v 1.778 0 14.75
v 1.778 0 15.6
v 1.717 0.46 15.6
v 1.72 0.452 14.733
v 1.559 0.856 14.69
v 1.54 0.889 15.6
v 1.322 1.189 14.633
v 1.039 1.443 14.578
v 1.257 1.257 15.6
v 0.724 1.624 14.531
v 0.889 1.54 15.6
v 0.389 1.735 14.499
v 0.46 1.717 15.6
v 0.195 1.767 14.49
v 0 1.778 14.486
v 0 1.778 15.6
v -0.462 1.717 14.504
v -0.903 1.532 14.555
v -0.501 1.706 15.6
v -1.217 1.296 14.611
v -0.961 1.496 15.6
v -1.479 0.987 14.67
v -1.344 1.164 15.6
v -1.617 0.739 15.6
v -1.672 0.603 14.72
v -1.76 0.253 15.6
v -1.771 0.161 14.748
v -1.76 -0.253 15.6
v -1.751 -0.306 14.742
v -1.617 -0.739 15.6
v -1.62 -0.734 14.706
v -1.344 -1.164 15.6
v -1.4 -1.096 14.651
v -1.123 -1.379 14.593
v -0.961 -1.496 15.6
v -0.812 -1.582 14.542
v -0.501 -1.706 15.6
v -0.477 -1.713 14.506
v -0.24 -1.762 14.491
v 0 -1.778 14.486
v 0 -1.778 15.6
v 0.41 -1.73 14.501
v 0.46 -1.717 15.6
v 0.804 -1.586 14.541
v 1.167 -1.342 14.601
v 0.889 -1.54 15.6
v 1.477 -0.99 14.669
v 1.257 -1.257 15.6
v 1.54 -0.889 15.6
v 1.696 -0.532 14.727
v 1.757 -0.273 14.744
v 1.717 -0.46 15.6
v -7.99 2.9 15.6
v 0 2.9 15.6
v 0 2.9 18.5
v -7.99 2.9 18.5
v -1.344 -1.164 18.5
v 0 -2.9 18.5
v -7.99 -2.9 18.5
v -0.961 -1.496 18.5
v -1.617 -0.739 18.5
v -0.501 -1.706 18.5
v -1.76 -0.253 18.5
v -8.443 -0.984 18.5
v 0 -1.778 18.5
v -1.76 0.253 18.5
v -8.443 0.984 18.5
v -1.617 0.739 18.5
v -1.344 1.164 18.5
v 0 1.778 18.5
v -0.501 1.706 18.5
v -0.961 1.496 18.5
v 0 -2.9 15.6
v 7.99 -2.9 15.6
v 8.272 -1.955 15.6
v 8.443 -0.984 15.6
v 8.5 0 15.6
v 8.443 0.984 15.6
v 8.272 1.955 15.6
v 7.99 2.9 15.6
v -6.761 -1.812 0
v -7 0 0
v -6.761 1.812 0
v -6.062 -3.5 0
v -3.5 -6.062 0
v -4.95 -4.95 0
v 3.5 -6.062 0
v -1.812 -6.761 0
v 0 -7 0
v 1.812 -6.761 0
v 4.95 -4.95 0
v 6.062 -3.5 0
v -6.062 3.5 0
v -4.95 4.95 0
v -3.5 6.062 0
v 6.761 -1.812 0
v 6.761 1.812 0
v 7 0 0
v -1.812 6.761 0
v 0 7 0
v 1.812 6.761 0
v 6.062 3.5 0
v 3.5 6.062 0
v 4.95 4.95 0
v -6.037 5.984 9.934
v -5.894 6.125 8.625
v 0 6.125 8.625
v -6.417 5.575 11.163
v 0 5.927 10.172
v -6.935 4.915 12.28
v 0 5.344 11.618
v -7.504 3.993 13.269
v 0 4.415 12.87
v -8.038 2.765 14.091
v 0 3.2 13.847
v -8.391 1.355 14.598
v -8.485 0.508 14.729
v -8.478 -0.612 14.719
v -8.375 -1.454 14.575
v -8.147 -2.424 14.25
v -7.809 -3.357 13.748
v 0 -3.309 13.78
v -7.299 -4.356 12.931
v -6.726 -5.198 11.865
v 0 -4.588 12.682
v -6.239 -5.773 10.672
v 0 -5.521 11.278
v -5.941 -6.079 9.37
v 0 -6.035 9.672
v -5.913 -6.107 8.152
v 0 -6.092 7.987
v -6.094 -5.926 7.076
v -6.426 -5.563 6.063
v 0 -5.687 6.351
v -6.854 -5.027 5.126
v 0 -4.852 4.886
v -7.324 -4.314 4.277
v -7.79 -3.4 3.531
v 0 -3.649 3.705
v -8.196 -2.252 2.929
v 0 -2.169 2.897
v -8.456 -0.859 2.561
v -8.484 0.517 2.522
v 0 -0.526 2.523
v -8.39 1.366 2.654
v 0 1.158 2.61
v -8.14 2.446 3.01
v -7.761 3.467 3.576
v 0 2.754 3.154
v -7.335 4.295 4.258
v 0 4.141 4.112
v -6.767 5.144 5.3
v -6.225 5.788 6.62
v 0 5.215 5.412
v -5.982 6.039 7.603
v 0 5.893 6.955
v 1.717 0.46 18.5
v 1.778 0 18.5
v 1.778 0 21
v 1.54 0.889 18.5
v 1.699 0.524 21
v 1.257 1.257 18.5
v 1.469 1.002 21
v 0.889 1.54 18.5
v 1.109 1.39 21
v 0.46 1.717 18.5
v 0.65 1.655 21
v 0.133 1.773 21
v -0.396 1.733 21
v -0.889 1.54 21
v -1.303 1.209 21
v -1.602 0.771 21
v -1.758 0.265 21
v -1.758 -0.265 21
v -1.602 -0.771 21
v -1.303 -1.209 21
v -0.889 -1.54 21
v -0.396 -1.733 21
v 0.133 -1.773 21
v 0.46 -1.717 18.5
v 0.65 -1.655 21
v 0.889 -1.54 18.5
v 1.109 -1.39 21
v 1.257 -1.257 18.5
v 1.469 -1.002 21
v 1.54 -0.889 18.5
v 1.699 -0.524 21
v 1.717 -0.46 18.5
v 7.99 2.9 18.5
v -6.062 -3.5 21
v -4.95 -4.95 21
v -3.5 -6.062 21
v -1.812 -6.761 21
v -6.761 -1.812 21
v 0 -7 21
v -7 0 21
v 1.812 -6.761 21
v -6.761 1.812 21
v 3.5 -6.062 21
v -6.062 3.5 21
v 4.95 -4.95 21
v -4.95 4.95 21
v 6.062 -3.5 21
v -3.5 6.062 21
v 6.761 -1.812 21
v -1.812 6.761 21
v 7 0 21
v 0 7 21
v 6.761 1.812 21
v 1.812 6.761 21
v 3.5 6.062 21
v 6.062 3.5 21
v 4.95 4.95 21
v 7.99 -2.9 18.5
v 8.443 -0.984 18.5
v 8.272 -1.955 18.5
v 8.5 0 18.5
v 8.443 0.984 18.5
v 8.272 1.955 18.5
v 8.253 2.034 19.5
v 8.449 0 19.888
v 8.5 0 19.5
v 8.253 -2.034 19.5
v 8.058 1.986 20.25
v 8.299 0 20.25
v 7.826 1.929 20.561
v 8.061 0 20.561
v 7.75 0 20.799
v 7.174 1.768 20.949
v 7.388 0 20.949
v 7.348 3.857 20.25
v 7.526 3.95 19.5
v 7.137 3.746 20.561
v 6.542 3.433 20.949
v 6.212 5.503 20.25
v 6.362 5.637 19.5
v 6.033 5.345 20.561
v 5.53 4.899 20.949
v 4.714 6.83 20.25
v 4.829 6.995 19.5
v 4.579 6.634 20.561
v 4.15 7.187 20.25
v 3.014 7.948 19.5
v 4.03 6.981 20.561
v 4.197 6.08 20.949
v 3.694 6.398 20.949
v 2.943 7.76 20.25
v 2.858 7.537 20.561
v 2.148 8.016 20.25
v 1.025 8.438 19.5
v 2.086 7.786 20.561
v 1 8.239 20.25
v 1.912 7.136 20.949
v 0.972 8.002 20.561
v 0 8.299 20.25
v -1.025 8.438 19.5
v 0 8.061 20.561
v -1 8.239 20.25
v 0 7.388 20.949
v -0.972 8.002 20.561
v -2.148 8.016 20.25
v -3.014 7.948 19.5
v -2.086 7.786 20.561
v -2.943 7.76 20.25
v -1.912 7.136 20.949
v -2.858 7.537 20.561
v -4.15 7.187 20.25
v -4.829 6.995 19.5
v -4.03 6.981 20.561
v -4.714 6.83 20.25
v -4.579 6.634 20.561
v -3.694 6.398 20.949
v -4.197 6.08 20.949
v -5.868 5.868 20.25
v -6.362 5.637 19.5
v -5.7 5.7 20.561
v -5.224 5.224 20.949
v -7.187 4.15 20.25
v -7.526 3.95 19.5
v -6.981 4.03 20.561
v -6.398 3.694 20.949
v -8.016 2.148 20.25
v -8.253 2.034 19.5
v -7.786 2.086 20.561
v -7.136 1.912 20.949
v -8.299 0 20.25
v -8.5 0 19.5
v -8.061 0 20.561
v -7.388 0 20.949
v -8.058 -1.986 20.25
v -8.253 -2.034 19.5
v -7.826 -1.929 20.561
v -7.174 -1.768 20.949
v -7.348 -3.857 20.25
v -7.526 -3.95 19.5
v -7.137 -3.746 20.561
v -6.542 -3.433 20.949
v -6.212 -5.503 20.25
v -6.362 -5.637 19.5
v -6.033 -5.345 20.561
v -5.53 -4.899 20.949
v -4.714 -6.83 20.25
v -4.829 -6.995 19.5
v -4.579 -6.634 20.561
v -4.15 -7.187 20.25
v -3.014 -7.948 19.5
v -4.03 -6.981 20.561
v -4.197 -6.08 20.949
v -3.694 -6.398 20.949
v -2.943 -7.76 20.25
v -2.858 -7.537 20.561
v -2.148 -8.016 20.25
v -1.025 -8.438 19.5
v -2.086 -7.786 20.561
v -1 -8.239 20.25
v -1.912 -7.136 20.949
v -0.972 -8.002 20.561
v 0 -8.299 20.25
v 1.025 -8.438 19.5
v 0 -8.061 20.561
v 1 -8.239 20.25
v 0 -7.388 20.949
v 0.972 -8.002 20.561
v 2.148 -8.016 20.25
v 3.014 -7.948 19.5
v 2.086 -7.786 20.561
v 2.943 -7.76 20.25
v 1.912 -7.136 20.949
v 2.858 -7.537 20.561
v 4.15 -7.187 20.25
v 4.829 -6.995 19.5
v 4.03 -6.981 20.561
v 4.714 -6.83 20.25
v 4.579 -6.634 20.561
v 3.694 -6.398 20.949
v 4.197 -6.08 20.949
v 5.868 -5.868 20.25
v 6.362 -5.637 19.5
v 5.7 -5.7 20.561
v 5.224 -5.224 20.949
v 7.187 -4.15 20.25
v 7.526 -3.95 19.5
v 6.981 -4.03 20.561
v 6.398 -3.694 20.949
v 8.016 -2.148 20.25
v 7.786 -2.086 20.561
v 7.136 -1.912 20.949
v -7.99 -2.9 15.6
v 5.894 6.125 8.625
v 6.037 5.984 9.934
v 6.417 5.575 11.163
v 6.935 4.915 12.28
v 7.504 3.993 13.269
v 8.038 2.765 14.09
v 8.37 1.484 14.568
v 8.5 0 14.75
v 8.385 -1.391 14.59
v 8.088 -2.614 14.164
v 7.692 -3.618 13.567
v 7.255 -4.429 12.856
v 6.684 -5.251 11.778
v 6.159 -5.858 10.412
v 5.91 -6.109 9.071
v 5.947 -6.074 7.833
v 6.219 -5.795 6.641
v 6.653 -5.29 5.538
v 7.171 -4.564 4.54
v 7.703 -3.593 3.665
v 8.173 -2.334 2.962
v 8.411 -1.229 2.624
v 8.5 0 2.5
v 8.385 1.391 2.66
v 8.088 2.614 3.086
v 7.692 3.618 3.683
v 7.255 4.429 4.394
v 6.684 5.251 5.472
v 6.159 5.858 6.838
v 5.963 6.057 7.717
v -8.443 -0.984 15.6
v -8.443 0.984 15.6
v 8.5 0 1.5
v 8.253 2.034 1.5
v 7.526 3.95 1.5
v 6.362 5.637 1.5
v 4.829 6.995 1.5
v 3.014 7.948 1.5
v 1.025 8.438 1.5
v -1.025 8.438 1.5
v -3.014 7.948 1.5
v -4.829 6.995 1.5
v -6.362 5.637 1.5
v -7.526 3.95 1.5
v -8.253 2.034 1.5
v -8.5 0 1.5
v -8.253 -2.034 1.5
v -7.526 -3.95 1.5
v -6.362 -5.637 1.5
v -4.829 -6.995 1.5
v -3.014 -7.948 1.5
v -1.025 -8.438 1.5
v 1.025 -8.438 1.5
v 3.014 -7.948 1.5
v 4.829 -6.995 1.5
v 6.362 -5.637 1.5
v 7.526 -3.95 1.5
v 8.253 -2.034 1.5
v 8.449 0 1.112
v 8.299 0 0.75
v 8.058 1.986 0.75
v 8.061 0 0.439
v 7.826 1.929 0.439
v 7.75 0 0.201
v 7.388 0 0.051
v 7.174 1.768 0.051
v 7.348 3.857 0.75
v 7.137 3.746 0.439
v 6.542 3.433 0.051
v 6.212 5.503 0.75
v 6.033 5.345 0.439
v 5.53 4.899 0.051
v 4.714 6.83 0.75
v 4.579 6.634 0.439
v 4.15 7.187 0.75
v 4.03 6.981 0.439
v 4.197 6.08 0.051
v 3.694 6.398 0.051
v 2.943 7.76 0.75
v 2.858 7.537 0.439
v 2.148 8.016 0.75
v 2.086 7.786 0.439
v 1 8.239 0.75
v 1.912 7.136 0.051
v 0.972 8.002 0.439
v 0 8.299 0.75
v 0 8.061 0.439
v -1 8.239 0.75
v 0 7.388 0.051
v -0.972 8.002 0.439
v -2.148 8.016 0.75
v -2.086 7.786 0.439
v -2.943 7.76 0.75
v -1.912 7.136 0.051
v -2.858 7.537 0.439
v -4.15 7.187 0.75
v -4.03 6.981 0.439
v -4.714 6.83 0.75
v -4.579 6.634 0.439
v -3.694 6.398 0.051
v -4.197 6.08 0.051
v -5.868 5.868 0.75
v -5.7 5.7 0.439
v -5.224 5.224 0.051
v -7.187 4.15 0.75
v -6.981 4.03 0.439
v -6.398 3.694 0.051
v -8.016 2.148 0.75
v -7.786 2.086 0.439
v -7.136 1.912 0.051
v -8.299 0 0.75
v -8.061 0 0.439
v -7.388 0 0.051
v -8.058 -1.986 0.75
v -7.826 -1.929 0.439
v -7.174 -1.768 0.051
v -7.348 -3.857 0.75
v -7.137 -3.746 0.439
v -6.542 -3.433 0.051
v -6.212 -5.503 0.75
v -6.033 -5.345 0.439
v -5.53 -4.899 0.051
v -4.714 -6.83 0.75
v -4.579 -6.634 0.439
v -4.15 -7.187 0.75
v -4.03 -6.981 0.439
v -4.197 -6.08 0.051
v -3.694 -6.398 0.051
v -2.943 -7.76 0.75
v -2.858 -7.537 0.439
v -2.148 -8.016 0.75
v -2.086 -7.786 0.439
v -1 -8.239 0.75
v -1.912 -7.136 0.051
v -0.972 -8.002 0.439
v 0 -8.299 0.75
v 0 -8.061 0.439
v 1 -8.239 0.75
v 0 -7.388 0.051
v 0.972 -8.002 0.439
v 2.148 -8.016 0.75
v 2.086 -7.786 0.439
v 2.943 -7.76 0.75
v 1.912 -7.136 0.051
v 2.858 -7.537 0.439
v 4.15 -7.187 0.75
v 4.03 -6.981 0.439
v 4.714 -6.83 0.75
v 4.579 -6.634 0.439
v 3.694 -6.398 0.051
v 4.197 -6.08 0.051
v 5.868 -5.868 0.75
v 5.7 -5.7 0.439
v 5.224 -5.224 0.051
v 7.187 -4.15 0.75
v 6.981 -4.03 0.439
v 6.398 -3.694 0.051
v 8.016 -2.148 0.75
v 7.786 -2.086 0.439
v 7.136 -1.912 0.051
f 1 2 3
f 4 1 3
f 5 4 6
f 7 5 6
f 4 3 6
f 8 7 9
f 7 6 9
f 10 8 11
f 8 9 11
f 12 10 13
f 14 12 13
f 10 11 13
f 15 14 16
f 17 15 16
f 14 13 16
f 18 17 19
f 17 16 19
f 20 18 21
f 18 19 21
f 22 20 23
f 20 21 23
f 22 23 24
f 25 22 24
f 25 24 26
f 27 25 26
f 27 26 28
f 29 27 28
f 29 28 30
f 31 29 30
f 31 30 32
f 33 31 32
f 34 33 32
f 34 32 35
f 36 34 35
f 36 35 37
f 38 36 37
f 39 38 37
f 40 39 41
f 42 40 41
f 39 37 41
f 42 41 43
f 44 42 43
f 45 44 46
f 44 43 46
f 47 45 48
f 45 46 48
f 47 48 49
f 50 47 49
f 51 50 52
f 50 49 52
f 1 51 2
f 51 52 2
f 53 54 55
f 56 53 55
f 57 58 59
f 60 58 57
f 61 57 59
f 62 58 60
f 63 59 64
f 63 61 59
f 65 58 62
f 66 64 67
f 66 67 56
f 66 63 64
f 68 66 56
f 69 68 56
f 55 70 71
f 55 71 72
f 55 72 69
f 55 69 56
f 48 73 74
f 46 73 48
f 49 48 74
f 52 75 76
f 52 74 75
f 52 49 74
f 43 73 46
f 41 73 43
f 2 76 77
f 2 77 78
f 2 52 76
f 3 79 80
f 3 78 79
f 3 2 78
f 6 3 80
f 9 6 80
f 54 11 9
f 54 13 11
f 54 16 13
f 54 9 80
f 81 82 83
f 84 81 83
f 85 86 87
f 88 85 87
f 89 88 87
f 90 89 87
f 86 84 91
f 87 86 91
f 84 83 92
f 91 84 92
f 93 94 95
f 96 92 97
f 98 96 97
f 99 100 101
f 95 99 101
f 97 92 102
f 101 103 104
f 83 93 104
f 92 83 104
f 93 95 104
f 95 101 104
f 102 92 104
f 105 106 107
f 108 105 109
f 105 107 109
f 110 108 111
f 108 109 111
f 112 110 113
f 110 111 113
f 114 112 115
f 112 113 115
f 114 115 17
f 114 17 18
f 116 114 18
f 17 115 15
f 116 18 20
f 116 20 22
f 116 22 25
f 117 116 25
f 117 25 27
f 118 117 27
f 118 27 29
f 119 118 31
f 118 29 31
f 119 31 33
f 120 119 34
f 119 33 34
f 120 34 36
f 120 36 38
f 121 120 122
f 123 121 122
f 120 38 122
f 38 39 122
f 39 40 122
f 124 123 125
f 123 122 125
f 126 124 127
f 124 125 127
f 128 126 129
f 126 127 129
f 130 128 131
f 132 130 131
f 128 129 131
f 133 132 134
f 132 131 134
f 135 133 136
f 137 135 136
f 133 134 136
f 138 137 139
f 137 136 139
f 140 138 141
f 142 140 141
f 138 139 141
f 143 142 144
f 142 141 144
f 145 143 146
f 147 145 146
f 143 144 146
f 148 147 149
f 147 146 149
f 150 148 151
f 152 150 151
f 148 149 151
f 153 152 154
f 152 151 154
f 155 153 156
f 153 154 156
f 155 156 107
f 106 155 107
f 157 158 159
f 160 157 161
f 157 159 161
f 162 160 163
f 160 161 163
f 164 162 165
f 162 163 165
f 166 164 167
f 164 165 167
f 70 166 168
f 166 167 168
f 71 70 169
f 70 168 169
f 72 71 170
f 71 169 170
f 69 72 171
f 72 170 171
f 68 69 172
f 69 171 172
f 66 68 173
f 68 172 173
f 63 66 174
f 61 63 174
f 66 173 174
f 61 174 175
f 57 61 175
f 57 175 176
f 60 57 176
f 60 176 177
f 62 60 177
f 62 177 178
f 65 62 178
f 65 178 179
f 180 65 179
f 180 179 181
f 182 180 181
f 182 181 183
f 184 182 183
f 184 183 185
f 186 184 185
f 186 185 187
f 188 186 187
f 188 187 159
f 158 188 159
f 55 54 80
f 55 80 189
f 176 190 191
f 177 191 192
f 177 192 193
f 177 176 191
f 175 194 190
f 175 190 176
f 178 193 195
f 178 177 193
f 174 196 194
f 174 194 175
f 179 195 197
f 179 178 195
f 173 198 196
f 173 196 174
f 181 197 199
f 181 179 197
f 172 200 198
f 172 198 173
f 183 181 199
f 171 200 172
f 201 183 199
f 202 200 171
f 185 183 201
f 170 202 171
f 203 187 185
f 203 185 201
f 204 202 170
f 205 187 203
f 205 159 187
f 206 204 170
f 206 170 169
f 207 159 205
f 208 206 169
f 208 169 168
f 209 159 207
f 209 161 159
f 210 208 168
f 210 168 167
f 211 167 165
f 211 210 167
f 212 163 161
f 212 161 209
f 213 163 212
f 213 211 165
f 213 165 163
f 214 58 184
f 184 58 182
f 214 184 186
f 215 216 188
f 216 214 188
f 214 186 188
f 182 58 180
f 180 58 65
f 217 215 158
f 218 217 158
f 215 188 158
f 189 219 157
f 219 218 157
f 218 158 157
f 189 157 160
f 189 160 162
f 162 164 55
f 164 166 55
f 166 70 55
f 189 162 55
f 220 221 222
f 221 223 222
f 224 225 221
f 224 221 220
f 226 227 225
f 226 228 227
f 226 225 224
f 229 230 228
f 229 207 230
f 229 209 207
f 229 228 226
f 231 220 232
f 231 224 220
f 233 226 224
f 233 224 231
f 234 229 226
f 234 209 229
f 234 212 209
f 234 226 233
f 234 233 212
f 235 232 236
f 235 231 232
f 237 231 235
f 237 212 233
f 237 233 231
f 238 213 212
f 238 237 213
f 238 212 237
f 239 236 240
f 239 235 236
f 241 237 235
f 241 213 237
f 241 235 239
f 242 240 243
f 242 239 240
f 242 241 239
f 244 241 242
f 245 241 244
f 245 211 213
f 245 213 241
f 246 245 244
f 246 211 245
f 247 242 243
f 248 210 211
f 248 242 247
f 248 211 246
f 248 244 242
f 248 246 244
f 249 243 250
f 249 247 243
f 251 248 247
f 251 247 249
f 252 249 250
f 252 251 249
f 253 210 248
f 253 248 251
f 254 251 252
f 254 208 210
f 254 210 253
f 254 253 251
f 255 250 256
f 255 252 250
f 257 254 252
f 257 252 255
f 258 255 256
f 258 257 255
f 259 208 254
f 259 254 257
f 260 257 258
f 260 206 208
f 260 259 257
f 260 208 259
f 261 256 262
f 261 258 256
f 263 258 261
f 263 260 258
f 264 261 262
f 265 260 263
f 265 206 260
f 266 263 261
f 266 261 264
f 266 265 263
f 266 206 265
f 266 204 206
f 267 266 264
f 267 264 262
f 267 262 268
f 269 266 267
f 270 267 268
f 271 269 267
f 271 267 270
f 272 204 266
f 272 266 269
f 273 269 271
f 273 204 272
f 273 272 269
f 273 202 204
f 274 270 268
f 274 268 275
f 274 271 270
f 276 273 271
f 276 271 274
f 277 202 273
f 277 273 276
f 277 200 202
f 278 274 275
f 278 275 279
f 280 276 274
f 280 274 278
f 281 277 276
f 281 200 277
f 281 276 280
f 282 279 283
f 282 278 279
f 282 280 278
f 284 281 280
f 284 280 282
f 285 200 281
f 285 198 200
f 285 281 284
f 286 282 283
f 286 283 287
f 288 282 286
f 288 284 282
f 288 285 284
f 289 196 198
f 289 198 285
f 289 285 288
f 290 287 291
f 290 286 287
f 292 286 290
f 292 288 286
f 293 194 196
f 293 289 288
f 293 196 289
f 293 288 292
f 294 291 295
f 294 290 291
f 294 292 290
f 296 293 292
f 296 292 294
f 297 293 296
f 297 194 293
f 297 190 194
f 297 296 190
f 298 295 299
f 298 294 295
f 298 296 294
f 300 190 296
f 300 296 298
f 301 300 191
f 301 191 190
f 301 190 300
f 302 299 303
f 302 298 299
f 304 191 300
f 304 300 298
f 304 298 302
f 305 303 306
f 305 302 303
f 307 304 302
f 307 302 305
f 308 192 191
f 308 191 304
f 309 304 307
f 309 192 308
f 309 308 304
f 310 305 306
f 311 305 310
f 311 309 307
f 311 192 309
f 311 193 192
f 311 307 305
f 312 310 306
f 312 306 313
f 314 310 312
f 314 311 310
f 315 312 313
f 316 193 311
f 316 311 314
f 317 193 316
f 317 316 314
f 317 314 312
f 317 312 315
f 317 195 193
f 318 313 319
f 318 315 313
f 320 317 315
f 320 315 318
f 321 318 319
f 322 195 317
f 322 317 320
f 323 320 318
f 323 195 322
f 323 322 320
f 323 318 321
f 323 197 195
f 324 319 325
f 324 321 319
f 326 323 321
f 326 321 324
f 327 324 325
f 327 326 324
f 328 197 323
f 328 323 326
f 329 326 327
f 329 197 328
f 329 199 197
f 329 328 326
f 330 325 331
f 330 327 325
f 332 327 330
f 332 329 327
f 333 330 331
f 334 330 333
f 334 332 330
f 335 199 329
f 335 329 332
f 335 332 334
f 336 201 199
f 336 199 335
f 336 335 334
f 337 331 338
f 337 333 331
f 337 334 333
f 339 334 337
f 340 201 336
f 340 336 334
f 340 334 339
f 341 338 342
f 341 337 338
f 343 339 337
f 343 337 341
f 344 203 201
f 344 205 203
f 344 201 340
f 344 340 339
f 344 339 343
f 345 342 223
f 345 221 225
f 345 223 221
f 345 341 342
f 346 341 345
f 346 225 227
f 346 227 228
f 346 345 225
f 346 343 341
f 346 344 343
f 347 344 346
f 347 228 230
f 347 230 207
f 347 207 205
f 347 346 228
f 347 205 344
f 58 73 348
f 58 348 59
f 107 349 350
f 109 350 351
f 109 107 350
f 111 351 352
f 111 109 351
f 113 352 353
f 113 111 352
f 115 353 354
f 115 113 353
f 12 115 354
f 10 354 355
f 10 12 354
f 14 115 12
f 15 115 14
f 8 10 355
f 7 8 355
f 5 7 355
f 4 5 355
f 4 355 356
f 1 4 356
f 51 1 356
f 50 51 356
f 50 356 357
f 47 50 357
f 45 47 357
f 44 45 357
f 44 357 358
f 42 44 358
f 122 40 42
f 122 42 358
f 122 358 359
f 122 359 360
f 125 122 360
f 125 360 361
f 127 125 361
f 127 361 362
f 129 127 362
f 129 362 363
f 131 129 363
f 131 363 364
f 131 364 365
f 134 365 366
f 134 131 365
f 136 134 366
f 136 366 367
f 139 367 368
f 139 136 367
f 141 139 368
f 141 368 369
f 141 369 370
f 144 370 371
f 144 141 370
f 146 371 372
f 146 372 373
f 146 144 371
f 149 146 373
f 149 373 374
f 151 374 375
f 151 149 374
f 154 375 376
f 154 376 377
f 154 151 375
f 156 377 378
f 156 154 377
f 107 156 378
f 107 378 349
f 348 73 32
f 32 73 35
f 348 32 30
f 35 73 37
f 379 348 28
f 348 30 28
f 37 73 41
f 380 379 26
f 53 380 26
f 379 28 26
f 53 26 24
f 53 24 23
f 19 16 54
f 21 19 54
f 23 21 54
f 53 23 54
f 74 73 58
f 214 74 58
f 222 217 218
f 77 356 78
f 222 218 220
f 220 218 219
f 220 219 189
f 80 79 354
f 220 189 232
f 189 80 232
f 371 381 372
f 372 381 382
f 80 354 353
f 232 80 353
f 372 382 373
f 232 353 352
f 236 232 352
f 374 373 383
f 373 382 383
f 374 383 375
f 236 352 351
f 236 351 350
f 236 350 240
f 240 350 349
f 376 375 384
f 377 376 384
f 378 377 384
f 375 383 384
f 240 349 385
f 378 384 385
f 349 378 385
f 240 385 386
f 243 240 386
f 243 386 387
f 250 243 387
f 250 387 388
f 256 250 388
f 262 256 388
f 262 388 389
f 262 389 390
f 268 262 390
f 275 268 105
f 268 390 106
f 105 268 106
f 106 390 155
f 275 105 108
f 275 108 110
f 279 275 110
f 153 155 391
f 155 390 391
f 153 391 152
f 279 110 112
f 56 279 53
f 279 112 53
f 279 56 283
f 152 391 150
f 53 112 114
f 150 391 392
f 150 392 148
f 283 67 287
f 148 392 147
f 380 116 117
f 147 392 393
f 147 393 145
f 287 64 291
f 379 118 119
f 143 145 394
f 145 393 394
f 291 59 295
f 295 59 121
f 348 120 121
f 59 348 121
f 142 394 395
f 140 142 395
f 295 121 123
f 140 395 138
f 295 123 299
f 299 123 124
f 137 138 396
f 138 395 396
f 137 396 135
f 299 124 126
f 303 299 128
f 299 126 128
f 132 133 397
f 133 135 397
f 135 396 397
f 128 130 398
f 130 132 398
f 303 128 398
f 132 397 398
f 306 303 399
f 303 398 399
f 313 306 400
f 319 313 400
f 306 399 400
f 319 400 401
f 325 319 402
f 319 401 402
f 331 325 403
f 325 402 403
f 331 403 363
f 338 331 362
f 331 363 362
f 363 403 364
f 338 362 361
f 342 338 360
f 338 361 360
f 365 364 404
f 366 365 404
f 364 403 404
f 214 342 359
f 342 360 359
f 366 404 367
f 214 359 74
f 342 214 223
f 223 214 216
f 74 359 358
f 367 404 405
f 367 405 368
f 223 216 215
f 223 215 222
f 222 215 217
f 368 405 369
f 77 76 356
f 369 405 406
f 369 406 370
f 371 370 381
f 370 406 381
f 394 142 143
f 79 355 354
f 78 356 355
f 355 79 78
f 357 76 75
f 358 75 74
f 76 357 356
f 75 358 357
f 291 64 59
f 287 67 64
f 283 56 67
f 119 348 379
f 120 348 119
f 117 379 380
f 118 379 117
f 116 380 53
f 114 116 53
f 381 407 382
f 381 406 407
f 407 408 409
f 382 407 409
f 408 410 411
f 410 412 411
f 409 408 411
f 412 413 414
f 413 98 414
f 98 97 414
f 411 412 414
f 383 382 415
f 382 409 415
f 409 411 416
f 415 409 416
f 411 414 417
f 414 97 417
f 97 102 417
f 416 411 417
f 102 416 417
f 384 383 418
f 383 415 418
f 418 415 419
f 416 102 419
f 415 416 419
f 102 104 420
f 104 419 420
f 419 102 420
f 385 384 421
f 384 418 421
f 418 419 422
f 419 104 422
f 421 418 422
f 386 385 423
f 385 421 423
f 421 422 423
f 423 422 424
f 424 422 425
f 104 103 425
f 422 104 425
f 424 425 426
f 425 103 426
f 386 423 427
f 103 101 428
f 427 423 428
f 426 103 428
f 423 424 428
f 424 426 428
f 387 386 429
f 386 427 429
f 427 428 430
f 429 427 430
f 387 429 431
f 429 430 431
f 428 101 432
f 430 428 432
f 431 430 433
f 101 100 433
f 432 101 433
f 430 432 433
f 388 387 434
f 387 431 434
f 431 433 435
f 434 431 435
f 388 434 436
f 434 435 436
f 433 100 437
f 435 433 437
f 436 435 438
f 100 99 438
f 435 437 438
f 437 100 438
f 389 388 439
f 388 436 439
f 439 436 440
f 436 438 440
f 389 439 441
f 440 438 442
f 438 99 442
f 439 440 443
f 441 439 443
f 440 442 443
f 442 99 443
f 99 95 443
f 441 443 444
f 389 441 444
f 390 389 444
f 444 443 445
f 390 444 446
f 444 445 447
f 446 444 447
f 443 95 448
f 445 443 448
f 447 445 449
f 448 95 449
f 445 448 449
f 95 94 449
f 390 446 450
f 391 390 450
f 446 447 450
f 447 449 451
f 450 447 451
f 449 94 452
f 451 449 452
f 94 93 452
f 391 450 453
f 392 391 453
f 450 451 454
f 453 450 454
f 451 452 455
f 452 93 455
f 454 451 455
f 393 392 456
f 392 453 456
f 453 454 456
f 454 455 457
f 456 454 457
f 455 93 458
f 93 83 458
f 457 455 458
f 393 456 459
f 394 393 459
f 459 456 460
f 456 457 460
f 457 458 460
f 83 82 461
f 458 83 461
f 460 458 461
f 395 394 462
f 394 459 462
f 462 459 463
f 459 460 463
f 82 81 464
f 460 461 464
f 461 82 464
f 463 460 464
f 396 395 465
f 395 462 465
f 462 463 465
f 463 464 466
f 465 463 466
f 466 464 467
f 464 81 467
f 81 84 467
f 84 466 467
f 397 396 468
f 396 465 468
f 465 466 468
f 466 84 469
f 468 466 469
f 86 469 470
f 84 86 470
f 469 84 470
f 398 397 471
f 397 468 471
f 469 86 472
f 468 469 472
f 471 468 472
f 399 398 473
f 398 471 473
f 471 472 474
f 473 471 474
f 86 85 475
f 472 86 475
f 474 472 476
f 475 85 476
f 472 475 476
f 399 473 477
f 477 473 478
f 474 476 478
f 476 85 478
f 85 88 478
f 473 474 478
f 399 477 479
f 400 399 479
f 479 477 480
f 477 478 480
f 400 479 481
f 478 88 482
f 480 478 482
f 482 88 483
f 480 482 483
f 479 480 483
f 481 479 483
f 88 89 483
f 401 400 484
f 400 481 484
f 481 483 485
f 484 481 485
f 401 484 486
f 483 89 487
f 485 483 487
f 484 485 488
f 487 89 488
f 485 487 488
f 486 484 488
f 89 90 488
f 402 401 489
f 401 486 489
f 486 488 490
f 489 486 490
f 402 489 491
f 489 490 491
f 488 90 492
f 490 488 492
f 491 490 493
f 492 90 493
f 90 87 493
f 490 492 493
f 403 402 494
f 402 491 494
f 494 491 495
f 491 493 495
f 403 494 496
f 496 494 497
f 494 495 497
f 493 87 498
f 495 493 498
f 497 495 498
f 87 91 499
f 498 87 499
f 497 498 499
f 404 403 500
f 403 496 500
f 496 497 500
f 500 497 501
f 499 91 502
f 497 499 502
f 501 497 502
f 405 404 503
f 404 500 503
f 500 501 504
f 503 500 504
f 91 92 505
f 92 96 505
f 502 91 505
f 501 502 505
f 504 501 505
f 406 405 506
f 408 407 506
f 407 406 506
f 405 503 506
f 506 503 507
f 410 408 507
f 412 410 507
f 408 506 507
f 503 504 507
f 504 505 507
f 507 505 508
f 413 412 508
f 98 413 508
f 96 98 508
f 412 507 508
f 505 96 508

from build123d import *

# Parameters (mm, degrees)
F0_R          = 8.5
F1_DEPTH      = 21
F2_R          = 6.125
F3_DEPTH      = 8.501
F3_DEPTH_BACK = 25.4
F4_R          = 1.5
F5_W          = 5.8
F5_H          = 2.9
F6_DEPTH      = 25.4
F6_DEPTH_BACK = 25.4
F7_R          = 1.778
F8_DEPTH      = 10


with BuildPart() as f1:
    # F0 (on Top) → F1 (new body)
    with BuildSketch(Plane.XY):
        Circle(F0_R)
    extrude(amount=F1_DEPTH)

    # F2 (on Right) → F3 (cut, two sides)
    with BuildSketch(Plane.YZ) as f3_sk:
        with Locations((0, 8.625)):
            Circle(F2_R)
    extrude(amount=-F3_DEPTH, mode=Mode.SUBTRACT)
    extrude(f3_sk.sketch, amount=F3_DEPTH_BACK, mode=Mode.SUBTRACT)

    # F4
    f4_edges = [f1.edges().sort_by_distance(p)[0] for p in [
        (-8.5, 0, 0),
        (-8.5, 0, 21),
    ]]
    fillet(f4_edges, radius=F4_R)

    # F5 (on Right) → F6 (cut, two sides)
    with BuildSketch(Plane.YZ) as f6_sk:
        with Locations((0, 17.05)):
            Rectangle(F5_W, F5_H)
    extrude(amount=-F6_DEPTH, mode=Mode.SUBTRACT)
    extrude(f6_sk.sketch, amount=F6_DEPTH_BACK, mode=Mode.SUBTRACT)

    # F7 (on face) → F8 (cut)
    with BuildSketch(Plane.XY.offset(21)):
        Circle(F7_R)
    extrude(amount=-F8_DEPTH, mode=Mode.SUBTRACT)


solid = f1.part
